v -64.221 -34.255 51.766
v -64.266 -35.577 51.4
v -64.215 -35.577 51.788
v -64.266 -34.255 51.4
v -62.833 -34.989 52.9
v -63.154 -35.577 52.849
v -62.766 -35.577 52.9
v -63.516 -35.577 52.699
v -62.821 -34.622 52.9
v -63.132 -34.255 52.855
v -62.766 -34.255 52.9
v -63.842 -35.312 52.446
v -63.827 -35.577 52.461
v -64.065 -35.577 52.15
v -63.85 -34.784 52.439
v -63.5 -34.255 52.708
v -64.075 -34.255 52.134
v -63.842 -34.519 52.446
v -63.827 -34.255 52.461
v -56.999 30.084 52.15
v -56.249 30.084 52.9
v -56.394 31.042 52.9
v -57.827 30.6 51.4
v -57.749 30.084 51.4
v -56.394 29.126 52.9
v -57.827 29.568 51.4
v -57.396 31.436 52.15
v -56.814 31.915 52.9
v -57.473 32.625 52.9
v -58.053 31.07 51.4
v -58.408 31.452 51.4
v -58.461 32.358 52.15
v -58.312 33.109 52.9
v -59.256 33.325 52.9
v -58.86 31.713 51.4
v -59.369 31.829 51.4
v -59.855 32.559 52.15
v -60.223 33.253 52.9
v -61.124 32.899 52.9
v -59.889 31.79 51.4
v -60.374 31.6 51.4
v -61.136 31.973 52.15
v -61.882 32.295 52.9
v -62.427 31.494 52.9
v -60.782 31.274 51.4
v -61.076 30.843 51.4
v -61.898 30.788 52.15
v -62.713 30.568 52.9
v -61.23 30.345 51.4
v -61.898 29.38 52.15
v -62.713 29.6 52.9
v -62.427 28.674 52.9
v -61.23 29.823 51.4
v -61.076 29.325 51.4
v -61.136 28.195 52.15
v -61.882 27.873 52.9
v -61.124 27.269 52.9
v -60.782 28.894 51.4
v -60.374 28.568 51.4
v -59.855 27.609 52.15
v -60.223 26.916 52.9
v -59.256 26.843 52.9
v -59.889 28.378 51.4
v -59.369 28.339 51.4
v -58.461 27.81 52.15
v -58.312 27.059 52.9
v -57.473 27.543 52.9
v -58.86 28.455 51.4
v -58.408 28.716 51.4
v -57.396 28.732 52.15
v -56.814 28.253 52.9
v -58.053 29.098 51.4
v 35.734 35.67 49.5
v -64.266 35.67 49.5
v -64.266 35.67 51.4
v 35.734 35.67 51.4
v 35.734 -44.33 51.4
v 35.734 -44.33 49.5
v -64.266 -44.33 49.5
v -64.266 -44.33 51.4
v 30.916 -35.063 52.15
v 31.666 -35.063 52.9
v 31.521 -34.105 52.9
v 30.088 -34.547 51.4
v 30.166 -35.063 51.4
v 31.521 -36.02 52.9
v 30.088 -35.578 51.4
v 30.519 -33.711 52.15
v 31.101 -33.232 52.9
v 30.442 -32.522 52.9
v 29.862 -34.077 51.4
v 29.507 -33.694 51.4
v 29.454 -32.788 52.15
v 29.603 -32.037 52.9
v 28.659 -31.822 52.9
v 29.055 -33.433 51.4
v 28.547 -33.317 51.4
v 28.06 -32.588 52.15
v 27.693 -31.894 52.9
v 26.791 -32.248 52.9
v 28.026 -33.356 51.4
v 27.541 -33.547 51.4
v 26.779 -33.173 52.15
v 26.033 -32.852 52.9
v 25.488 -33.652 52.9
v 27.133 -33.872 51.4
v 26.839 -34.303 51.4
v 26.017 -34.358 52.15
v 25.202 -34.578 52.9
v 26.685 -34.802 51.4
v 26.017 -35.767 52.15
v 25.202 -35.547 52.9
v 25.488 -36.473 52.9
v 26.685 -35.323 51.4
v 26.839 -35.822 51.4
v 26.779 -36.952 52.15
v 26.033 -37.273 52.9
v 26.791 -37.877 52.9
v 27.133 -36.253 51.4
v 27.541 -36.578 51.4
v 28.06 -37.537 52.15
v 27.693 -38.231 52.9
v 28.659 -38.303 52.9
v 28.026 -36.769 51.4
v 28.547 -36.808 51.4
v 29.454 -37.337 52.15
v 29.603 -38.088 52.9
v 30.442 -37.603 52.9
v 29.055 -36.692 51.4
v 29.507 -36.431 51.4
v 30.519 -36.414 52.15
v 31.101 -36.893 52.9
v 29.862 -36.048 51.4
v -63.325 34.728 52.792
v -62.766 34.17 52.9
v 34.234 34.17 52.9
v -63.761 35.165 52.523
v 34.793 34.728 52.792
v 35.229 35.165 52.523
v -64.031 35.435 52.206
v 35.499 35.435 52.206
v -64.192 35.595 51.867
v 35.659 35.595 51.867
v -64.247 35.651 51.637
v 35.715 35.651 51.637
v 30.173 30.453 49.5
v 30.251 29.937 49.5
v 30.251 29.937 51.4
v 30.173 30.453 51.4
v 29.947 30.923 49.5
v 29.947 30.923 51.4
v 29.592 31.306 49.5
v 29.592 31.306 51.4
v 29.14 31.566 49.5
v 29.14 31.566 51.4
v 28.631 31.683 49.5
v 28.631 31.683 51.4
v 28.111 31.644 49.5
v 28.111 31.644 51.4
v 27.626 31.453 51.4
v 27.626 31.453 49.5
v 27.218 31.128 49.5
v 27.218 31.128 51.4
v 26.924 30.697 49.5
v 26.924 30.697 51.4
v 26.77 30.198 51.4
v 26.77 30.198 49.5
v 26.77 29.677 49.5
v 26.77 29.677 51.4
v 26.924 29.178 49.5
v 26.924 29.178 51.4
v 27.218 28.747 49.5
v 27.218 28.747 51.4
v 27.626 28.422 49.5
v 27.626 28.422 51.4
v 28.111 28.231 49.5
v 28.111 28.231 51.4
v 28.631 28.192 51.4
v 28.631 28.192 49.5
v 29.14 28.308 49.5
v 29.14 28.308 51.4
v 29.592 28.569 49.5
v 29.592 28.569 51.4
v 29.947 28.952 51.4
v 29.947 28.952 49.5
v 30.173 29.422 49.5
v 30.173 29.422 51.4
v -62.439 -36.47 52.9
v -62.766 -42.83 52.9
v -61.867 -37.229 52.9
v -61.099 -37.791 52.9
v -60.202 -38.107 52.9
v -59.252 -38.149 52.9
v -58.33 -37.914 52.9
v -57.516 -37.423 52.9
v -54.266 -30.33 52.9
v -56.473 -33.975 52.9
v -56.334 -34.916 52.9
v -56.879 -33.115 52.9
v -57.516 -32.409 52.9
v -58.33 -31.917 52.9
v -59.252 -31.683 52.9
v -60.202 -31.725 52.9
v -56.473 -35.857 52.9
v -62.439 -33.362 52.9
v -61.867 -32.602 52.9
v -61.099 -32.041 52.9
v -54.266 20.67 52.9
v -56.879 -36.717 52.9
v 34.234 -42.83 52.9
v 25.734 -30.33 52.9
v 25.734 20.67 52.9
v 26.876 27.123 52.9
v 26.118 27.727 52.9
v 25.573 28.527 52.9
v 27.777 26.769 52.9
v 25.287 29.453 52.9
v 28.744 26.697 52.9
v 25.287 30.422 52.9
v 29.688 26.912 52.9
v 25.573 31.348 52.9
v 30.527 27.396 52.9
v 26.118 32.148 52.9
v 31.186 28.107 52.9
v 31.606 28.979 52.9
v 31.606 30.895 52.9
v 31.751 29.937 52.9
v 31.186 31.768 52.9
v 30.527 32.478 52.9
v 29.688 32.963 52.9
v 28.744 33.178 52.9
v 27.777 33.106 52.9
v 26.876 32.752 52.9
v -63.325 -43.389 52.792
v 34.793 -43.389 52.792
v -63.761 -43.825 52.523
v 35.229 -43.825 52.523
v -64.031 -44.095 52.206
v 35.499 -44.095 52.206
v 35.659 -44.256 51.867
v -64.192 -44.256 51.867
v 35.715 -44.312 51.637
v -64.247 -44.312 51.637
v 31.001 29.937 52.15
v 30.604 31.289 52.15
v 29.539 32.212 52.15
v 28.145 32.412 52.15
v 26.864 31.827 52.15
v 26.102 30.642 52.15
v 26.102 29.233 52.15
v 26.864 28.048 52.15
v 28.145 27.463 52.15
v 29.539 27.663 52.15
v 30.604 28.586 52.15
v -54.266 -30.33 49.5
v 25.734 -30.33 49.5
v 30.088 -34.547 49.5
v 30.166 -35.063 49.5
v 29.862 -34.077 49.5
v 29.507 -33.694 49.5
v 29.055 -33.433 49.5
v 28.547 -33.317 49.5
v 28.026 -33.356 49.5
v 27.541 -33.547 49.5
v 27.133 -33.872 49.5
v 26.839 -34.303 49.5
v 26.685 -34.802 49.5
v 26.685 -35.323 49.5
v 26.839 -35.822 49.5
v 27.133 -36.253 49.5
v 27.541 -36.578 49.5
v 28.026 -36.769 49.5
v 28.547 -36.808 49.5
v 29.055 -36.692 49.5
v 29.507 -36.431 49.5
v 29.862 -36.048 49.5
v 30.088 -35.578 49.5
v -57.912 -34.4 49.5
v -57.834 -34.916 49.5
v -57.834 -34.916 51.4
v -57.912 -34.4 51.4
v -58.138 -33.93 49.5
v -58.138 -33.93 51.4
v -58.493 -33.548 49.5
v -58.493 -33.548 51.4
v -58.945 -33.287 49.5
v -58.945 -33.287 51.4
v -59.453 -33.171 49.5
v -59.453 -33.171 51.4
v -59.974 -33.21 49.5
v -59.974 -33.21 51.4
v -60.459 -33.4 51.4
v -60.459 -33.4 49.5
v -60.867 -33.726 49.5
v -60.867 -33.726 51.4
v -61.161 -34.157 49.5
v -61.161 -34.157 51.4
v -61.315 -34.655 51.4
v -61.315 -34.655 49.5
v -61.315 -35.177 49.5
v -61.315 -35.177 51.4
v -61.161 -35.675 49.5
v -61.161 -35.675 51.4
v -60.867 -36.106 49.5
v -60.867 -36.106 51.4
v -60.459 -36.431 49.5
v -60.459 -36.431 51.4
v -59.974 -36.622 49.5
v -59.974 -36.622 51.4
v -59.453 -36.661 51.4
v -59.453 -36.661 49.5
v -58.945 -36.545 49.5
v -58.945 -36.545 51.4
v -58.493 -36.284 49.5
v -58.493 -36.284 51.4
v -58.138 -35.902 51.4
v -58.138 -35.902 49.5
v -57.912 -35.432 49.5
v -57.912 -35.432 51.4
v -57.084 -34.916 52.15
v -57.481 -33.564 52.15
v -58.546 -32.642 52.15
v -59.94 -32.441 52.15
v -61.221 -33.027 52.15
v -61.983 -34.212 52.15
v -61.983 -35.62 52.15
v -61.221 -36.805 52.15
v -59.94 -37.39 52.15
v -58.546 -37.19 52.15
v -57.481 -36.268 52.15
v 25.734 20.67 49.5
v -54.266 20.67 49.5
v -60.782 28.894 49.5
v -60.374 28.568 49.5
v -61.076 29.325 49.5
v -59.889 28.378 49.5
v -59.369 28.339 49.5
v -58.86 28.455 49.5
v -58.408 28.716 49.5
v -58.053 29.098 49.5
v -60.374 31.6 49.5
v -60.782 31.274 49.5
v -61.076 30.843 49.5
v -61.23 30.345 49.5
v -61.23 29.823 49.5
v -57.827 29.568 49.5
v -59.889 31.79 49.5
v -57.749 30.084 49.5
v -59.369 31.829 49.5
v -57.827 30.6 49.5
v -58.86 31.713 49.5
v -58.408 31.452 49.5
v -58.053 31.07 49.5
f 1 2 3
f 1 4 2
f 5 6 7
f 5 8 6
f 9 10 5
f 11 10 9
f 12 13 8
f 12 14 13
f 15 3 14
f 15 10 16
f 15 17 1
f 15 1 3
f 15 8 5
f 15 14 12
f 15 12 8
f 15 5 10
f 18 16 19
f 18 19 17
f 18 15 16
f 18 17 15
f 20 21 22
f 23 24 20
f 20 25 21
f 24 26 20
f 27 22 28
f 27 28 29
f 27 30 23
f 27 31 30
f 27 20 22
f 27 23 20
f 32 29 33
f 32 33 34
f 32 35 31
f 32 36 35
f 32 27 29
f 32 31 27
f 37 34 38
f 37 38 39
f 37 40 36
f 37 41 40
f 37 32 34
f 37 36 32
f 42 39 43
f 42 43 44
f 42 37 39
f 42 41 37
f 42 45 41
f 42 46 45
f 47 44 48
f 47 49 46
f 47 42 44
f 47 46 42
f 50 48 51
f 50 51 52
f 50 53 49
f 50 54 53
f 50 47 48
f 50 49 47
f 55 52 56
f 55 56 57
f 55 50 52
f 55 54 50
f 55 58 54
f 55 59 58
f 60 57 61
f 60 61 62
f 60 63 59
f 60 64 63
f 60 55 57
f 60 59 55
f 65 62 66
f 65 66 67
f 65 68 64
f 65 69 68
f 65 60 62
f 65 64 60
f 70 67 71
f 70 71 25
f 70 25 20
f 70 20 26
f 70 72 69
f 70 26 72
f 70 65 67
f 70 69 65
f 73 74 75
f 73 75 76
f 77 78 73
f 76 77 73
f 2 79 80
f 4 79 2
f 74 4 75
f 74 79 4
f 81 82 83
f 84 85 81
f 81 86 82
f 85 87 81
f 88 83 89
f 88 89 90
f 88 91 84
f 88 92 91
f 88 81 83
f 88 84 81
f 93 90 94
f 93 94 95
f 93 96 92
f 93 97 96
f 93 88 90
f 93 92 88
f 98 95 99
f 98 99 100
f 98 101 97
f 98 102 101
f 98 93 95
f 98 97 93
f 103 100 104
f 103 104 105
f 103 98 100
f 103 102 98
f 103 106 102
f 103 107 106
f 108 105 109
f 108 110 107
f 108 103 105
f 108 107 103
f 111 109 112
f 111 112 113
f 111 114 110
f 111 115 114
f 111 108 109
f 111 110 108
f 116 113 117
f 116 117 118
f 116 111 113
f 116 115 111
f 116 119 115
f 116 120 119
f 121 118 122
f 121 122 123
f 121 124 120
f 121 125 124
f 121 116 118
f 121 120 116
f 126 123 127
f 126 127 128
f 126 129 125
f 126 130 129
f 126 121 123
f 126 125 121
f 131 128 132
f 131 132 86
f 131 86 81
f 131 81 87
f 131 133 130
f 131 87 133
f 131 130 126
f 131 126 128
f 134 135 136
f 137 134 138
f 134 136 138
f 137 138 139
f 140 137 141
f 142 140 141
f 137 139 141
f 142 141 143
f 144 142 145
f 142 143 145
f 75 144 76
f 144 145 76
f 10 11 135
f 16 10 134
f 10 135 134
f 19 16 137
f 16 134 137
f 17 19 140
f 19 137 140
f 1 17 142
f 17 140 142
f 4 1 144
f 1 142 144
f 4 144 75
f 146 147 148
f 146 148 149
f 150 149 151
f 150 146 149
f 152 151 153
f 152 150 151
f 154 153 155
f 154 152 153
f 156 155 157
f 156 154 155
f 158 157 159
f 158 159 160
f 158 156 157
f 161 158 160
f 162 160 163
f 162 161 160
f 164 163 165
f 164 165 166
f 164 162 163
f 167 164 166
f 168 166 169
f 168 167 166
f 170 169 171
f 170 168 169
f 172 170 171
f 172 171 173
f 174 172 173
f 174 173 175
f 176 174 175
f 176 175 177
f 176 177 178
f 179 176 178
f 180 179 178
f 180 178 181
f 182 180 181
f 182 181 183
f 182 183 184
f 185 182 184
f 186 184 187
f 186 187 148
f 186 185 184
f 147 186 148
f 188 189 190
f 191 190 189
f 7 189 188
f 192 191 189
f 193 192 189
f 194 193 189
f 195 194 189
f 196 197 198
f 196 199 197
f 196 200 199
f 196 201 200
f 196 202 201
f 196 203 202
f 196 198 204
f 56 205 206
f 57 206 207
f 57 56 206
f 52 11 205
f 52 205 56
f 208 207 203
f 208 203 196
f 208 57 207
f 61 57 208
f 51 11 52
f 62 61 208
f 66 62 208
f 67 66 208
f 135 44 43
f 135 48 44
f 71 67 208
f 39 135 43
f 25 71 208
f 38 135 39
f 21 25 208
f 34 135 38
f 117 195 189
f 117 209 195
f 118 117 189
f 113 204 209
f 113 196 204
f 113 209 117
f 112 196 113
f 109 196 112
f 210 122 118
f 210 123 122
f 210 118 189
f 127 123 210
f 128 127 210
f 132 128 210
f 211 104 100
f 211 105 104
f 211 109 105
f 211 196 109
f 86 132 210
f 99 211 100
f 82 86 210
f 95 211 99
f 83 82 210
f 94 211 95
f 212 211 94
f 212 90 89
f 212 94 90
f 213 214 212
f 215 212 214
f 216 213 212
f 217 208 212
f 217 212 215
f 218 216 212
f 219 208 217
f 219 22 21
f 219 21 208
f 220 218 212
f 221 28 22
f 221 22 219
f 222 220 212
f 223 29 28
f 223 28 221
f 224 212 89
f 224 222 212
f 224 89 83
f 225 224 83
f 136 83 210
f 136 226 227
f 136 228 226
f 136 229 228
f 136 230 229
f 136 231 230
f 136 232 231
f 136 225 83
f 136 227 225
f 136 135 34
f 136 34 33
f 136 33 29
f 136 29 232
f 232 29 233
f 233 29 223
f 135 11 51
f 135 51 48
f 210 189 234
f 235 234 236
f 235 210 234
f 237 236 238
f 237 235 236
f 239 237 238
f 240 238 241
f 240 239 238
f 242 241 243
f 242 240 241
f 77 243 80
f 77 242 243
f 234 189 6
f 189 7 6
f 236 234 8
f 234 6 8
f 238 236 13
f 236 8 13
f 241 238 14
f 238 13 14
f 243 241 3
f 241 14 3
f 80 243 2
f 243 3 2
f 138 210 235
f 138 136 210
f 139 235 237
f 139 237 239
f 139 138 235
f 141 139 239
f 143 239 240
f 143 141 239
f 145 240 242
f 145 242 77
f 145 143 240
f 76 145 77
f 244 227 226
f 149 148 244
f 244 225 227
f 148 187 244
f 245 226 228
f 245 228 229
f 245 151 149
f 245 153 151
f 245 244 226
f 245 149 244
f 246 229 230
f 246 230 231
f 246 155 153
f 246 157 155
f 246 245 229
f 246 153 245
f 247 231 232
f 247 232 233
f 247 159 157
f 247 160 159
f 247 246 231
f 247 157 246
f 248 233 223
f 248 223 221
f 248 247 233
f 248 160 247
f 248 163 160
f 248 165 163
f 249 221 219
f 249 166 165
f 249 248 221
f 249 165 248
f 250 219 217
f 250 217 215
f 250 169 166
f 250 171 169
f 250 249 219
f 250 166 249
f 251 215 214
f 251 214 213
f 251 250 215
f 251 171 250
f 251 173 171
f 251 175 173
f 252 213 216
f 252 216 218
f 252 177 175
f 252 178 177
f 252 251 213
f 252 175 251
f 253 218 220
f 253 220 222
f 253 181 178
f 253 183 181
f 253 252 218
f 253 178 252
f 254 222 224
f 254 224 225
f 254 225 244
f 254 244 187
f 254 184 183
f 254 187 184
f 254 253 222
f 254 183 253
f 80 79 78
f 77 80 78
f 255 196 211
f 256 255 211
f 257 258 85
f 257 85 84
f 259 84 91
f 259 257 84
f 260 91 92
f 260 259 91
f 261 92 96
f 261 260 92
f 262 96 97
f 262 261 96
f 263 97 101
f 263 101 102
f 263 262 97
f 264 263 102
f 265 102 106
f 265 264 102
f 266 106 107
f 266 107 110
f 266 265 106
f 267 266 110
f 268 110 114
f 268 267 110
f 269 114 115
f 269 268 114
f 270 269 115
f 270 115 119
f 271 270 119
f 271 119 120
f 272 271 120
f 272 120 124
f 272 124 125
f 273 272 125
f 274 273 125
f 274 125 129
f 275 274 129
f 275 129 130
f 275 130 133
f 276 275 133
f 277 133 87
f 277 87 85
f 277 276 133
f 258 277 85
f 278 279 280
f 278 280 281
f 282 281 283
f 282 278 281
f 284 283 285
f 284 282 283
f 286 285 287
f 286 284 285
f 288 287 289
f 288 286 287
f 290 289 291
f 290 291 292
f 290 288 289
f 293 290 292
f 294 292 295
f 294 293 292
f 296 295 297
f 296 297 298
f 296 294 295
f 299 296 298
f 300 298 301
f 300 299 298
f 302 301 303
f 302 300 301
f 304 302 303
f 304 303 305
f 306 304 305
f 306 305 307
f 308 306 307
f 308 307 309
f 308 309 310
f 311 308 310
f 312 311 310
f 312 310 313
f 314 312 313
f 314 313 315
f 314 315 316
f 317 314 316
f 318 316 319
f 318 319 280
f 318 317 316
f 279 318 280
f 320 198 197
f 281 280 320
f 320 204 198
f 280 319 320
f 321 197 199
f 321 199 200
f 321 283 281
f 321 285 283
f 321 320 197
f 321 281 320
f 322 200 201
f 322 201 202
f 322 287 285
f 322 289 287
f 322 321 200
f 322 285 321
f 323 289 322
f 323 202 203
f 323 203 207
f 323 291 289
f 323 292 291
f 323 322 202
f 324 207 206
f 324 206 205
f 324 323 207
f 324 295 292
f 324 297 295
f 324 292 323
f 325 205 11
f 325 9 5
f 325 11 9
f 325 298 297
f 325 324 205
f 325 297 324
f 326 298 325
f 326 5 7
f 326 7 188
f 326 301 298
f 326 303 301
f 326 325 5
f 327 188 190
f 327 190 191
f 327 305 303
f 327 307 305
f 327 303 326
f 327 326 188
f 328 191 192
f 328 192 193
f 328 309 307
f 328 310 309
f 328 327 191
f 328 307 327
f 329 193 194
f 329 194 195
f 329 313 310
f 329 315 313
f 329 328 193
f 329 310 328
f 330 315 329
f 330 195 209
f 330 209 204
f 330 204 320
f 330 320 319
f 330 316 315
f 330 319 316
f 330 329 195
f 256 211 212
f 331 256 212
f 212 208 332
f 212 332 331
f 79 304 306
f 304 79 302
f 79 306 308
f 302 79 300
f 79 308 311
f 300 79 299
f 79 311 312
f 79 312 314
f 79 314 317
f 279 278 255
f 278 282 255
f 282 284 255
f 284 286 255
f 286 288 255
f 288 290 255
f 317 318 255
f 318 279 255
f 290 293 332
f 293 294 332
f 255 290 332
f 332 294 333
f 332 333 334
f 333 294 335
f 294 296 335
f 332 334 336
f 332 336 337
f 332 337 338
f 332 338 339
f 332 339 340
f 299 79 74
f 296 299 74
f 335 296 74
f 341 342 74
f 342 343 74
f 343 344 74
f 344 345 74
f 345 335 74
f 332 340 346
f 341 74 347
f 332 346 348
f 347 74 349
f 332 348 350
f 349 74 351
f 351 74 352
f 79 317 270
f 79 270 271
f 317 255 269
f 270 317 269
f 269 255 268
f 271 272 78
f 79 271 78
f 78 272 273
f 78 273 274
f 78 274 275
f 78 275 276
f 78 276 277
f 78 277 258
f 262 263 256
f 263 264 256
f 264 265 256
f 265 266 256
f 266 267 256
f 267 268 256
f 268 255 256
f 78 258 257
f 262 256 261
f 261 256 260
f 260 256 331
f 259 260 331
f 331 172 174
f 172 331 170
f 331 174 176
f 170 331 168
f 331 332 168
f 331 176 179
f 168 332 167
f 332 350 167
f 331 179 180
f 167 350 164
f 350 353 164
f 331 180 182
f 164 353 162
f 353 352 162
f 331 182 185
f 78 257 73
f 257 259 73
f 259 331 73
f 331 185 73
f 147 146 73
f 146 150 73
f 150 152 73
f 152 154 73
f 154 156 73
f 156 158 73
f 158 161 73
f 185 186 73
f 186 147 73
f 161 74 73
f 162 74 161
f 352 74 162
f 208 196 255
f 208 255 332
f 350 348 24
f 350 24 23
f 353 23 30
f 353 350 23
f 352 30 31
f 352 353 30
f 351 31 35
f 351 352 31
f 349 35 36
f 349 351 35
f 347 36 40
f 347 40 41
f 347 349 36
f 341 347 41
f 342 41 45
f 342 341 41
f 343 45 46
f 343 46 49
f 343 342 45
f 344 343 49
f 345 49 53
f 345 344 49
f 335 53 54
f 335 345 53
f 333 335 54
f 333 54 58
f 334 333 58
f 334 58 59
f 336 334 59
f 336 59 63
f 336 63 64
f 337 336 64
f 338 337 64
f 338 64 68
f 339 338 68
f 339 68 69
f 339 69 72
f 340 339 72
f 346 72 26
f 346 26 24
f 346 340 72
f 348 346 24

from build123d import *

# Parameters (mm, degrees)
SKETCH002_W  = 100
SKETCH002_H  = 80
SKETCH002_R  = 1.75
PAD004_DEPTH = 3.4
SKETCH_W     = 80
SKETCH_H     = 51
POCKET_DEPTH = 5
CHAMFER_SIZE = 1.5
FILLET_R     = 1.5


with BuildPart() as part:
    # Sketch002 → Pad004 (new body)
    with BuildSketch(Plane.XY.offset(49.5)):
        with Locations((-14.266246, -4.330319)):
            Rectangle(SKETCH002_W, SKETCH002_H)
        with Locations((-59.499317, 30.08403)):
            Circle(SKETCH002_R, mode=Mode.SUBTRACT)
        with Locations((-59.584126, -34.915915)):
            Circle(SKETCH002_R, mode=Mode.SUBTRACT)
        with Locations((28.500684, 29.937426)):
            Circle(SKETCH002_R, mode=Mode.SUBTRACT)
        with Locations((28.415874, -35.062521)):
            Circle(SKETCH002_R, mode=Mode.SUBTRACT)
    extrude(amount=PAD004_DEPTH)

    # Sketch (on Face10 of Pad004) → Pocket (cut)
    with BuildSketch(Plane.XY.offset(52.9)):
        with Locations((-14.266246, -4.830319)):
            Rectangle(SKETCH_W, SKETCH_H)
    extrude(amount=-POCKET_DEPTH, mode=Mode.SUBTRACT)

    # Chamfer
    chamfer_edges = [part.edges().sort_by_distance(p)[0] for p in [
        (-61.334126, -34.915915, 52.9),
        (-61.249317, 30.08403, 52.9),
        (26.750684, 29.937426, 52.9),
        (26.665874, -35.062521, 52.9),
    ]]
    chamfer(chamfer_edges, length=CHAMFER_SIZE)

    # Fillet
    fillet_edges = [part.edges().sort_by_distance(p)[0] for p in [
        (-64.266246, -4.330319, 52.9),
        (-14.266246, -44.330319, 52.9),
        (35.733754, -4.330319, 52.9),
        (-14.266246, 35.669681, 52.9),
    ]]
    fillet(fillet_edges, radius=FILLET_R)


solid = part.part
